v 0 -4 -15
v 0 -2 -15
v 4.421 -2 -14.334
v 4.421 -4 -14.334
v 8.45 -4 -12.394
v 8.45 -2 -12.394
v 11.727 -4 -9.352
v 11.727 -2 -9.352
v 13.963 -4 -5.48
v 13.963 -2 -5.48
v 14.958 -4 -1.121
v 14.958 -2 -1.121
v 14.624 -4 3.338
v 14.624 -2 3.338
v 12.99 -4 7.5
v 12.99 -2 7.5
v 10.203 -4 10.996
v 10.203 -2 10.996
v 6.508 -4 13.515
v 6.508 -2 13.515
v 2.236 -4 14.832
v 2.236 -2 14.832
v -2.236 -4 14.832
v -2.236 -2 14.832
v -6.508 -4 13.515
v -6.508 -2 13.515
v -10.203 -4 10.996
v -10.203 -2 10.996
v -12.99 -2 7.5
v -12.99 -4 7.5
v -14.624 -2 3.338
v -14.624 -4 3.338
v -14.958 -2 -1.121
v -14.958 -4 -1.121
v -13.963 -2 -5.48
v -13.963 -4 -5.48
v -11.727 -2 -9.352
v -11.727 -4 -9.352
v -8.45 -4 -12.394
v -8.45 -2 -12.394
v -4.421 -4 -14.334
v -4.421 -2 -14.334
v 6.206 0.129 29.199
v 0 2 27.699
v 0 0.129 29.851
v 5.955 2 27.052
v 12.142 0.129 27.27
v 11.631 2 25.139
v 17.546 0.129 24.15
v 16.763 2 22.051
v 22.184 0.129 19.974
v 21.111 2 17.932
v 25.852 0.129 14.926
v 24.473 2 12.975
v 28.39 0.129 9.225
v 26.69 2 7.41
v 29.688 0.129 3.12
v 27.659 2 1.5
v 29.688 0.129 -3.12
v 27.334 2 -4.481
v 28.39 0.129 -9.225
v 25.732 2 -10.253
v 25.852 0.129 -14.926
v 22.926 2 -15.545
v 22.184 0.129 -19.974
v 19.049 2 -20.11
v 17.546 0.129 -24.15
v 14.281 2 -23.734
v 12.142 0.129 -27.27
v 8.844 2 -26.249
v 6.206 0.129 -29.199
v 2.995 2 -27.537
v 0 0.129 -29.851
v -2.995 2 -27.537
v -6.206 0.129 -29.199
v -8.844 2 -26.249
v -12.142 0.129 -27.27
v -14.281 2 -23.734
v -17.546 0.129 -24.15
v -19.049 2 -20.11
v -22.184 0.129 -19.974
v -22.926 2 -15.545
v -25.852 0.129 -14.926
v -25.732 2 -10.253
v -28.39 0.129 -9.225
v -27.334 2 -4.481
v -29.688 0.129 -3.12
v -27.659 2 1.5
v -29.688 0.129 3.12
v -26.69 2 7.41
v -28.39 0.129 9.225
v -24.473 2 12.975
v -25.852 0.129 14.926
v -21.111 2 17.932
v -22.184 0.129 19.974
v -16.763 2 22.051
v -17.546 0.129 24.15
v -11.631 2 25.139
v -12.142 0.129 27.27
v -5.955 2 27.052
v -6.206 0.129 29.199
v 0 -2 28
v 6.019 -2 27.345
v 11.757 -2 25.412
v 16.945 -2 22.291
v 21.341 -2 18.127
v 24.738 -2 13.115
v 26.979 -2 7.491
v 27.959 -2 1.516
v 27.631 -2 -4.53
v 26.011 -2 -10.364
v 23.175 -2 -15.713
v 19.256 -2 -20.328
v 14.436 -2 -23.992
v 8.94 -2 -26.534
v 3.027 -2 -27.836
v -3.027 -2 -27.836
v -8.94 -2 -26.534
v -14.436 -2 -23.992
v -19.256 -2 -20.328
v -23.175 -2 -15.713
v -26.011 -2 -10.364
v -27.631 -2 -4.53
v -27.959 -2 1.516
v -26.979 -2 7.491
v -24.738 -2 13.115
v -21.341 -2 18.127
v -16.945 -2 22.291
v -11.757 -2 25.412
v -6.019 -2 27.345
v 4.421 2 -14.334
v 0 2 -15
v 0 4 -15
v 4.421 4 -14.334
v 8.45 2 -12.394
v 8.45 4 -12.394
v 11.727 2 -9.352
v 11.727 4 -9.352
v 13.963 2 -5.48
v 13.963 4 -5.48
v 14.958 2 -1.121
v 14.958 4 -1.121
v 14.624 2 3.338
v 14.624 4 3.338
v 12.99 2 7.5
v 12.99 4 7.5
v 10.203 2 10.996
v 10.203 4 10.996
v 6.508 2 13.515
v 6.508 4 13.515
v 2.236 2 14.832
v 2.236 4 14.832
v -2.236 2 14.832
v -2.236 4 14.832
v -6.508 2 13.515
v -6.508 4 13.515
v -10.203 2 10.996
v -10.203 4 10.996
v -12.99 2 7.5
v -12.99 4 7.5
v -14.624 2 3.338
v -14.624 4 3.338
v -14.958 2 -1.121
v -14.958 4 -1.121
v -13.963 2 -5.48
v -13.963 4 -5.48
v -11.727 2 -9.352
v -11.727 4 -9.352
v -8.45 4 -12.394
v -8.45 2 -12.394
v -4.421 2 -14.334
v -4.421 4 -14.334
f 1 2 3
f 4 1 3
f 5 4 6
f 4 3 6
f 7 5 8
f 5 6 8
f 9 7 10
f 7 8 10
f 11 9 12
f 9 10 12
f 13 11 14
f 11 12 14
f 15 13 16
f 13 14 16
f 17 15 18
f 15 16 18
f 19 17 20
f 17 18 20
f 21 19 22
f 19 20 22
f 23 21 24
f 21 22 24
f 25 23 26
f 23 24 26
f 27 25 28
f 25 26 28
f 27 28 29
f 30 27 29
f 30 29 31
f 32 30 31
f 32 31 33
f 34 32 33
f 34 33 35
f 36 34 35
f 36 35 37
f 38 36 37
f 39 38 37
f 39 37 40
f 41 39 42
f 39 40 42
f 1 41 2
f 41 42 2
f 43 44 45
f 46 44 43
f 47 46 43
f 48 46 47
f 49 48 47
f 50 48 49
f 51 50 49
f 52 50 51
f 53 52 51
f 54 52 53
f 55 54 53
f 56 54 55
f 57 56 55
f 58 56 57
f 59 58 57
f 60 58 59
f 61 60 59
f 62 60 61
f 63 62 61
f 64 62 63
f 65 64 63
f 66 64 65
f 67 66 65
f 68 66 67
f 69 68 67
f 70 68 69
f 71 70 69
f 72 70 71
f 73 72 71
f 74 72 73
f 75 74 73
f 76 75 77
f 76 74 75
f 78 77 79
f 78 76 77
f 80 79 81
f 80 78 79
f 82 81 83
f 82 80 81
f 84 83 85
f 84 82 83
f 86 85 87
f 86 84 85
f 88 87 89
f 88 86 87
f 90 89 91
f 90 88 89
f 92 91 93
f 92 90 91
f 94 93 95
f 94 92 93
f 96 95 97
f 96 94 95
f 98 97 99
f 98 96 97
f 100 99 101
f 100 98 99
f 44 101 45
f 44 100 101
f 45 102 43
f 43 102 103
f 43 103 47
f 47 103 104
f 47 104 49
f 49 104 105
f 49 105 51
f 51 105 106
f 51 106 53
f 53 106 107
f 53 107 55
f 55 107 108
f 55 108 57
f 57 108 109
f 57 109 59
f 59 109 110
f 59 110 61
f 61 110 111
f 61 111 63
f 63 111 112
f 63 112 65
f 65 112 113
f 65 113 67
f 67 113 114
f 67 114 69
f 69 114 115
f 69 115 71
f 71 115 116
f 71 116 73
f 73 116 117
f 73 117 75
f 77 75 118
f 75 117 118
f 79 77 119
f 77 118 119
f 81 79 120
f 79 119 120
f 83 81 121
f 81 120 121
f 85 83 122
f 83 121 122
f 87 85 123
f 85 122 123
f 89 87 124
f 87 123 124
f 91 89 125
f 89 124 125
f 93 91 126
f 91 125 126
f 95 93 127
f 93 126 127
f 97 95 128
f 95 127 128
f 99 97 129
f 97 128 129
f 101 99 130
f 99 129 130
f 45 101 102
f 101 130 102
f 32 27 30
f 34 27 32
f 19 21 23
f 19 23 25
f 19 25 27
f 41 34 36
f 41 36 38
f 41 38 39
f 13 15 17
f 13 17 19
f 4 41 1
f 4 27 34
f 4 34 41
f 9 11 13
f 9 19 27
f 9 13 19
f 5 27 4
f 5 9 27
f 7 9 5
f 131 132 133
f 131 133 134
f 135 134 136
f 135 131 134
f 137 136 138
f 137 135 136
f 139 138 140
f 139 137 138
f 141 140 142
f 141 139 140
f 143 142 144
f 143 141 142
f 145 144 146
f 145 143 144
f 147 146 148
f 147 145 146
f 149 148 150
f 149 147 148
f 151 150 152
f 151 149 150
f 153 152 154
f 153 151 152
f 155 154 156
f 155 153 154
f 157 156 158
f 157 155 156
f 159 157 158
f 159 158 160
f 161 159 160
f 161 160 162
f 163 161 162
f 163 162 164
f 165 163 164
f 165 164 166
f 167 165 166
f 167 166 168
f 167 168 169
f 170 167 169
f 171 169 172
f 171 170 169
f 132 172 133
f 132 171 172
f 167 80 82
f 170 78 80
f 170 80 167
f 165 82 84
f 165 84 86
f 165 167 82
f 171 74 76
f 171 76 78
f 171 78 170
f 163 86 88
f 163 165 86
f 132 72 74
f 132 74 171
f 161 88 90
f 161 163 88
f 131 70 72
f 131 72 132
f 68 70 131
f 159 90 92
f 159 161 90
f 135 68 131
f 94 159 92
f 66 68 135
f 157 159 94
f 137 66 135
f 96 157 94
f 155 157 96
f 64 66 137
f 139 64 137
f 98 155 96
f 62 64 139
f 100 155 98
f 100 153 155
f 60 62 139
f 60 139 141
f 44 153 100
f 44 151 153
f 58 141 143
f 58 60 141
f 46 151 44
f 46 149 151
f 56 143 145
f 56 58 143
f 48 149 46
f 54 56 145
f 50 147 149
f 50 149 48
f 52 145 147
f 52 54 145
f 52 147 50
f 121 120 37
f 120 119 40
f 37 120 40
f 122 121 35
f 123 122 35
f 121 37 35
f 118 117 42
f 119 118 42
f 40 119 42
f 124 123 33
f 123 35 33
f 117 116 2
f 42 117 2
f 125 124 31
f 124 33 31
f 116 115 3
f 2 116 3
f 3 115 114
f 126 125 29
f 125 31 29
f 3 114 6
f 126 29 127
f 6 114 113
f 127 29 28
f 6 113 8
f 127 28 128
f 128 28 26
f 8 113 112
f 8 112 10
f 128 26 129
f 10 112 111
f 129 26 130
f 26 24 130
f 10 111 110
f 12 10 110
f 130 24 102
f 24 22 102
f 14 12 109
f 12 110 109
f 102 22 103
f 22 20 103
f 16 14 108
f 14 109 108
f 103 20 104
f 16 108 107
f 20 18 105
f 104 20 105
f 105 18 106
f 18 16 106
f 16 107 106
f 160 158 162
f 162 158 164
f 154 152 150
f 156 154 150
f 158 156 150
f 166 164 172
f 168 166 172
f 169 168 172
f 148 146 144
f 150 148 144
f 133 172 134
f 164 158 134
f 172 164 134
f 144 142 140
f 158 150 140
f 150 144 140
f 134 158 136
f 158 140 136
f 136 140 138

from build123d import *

# Parameters (mm, degrees)
BOSS_EXTRU_1_DEPTH      = 2
BOSS_EXTRU_1_DEPTH_BACK = 2
ESQUISSE1_R             = 30
CHANFREIN1_SIZE2        = 2.300736814
CHANFREIN1_SIZE         = 2
CHANFREIN2_SIZE         = 2.300736814
CHANFREIN2_SIZE_2       = 2
ESQUISSE2_R             = 15
BOSS_EXTRU_2_DEPTH      = 2


# Some blends are built 0.0001 mm under size
with BuildPart() as part:
    # Esquisse1 → Boss.-Extru.1 (new, two sides: drawn at the far end of the back side and taken through both)
    with BuildSketch(Plane(origin=(0, 0, 0), x_dir=(1, 0, 0), z_dir=(0, 1, 0)).offset(-BOSS_EXTRU_1_DEPTH_BACK)):
        with Locations(Location((0, 0, 0), (0, 0, 270))):
            Circle(ESQUISSE1_R)
    extrude(amount=BOSS_EXTRU_1_DEPTH + BOSS_EXTRU_1_DEPTH_BACK)

    # Chanfrein1
    chanfrein1_edges = [part.edges().sort_by_distance(p)[0] for p in [
        (0, 2, -30),
    ]]
    chanfrein1_side = [part.faces().sort_by_distance(p)[0] for p in [
        (0, 1.96, -30),
    ]]
    chamfer(chanfrein1_edges, length=CHANFREIN1_SIZE - 0.0001, length2=CHANFREIN1_SIZE2 - 0.0001, reference=chanfrein1_side[0])  # a hair under: the kernel refuses the full size

    # Chanfrein2
    # the kernel refuses this chamfer: 2.300736814, 2 mm, written as the material it takes off along each edge
    with BuildSketch(Plane(origin=(0, -2, 0), x_dir=(0, 0, 1), z_dir=(-1, 0, 0))) as chanfrein2_piece_1:
        Polygon((30, CHANFREIN2_SIZE), (30 - CHANFREIN2_SIZE_2, 0), (30, 0), align=None)
    revolve(axis=Axis((0, -2, 0), (0, 1, 0)), mode=Mode.SUBTRACT)

    # Esquisse2 → Boss.-Extru.2 (add)
    with BuildSketch(Plane.XZ.offset(2)):
        with Locations(Location((0, 0, 0), (0, 0, 270))):
            Circle(ESQUISSE2_R)
    boss_extru_2 = extrude(amount=BOSS_EXTRU_2_DEPTH)

    # Symétrie1: Boss.-Extru.2 across plane
    add(boss_extru_2.mirror(Plane.ZX))


solid = part.part
